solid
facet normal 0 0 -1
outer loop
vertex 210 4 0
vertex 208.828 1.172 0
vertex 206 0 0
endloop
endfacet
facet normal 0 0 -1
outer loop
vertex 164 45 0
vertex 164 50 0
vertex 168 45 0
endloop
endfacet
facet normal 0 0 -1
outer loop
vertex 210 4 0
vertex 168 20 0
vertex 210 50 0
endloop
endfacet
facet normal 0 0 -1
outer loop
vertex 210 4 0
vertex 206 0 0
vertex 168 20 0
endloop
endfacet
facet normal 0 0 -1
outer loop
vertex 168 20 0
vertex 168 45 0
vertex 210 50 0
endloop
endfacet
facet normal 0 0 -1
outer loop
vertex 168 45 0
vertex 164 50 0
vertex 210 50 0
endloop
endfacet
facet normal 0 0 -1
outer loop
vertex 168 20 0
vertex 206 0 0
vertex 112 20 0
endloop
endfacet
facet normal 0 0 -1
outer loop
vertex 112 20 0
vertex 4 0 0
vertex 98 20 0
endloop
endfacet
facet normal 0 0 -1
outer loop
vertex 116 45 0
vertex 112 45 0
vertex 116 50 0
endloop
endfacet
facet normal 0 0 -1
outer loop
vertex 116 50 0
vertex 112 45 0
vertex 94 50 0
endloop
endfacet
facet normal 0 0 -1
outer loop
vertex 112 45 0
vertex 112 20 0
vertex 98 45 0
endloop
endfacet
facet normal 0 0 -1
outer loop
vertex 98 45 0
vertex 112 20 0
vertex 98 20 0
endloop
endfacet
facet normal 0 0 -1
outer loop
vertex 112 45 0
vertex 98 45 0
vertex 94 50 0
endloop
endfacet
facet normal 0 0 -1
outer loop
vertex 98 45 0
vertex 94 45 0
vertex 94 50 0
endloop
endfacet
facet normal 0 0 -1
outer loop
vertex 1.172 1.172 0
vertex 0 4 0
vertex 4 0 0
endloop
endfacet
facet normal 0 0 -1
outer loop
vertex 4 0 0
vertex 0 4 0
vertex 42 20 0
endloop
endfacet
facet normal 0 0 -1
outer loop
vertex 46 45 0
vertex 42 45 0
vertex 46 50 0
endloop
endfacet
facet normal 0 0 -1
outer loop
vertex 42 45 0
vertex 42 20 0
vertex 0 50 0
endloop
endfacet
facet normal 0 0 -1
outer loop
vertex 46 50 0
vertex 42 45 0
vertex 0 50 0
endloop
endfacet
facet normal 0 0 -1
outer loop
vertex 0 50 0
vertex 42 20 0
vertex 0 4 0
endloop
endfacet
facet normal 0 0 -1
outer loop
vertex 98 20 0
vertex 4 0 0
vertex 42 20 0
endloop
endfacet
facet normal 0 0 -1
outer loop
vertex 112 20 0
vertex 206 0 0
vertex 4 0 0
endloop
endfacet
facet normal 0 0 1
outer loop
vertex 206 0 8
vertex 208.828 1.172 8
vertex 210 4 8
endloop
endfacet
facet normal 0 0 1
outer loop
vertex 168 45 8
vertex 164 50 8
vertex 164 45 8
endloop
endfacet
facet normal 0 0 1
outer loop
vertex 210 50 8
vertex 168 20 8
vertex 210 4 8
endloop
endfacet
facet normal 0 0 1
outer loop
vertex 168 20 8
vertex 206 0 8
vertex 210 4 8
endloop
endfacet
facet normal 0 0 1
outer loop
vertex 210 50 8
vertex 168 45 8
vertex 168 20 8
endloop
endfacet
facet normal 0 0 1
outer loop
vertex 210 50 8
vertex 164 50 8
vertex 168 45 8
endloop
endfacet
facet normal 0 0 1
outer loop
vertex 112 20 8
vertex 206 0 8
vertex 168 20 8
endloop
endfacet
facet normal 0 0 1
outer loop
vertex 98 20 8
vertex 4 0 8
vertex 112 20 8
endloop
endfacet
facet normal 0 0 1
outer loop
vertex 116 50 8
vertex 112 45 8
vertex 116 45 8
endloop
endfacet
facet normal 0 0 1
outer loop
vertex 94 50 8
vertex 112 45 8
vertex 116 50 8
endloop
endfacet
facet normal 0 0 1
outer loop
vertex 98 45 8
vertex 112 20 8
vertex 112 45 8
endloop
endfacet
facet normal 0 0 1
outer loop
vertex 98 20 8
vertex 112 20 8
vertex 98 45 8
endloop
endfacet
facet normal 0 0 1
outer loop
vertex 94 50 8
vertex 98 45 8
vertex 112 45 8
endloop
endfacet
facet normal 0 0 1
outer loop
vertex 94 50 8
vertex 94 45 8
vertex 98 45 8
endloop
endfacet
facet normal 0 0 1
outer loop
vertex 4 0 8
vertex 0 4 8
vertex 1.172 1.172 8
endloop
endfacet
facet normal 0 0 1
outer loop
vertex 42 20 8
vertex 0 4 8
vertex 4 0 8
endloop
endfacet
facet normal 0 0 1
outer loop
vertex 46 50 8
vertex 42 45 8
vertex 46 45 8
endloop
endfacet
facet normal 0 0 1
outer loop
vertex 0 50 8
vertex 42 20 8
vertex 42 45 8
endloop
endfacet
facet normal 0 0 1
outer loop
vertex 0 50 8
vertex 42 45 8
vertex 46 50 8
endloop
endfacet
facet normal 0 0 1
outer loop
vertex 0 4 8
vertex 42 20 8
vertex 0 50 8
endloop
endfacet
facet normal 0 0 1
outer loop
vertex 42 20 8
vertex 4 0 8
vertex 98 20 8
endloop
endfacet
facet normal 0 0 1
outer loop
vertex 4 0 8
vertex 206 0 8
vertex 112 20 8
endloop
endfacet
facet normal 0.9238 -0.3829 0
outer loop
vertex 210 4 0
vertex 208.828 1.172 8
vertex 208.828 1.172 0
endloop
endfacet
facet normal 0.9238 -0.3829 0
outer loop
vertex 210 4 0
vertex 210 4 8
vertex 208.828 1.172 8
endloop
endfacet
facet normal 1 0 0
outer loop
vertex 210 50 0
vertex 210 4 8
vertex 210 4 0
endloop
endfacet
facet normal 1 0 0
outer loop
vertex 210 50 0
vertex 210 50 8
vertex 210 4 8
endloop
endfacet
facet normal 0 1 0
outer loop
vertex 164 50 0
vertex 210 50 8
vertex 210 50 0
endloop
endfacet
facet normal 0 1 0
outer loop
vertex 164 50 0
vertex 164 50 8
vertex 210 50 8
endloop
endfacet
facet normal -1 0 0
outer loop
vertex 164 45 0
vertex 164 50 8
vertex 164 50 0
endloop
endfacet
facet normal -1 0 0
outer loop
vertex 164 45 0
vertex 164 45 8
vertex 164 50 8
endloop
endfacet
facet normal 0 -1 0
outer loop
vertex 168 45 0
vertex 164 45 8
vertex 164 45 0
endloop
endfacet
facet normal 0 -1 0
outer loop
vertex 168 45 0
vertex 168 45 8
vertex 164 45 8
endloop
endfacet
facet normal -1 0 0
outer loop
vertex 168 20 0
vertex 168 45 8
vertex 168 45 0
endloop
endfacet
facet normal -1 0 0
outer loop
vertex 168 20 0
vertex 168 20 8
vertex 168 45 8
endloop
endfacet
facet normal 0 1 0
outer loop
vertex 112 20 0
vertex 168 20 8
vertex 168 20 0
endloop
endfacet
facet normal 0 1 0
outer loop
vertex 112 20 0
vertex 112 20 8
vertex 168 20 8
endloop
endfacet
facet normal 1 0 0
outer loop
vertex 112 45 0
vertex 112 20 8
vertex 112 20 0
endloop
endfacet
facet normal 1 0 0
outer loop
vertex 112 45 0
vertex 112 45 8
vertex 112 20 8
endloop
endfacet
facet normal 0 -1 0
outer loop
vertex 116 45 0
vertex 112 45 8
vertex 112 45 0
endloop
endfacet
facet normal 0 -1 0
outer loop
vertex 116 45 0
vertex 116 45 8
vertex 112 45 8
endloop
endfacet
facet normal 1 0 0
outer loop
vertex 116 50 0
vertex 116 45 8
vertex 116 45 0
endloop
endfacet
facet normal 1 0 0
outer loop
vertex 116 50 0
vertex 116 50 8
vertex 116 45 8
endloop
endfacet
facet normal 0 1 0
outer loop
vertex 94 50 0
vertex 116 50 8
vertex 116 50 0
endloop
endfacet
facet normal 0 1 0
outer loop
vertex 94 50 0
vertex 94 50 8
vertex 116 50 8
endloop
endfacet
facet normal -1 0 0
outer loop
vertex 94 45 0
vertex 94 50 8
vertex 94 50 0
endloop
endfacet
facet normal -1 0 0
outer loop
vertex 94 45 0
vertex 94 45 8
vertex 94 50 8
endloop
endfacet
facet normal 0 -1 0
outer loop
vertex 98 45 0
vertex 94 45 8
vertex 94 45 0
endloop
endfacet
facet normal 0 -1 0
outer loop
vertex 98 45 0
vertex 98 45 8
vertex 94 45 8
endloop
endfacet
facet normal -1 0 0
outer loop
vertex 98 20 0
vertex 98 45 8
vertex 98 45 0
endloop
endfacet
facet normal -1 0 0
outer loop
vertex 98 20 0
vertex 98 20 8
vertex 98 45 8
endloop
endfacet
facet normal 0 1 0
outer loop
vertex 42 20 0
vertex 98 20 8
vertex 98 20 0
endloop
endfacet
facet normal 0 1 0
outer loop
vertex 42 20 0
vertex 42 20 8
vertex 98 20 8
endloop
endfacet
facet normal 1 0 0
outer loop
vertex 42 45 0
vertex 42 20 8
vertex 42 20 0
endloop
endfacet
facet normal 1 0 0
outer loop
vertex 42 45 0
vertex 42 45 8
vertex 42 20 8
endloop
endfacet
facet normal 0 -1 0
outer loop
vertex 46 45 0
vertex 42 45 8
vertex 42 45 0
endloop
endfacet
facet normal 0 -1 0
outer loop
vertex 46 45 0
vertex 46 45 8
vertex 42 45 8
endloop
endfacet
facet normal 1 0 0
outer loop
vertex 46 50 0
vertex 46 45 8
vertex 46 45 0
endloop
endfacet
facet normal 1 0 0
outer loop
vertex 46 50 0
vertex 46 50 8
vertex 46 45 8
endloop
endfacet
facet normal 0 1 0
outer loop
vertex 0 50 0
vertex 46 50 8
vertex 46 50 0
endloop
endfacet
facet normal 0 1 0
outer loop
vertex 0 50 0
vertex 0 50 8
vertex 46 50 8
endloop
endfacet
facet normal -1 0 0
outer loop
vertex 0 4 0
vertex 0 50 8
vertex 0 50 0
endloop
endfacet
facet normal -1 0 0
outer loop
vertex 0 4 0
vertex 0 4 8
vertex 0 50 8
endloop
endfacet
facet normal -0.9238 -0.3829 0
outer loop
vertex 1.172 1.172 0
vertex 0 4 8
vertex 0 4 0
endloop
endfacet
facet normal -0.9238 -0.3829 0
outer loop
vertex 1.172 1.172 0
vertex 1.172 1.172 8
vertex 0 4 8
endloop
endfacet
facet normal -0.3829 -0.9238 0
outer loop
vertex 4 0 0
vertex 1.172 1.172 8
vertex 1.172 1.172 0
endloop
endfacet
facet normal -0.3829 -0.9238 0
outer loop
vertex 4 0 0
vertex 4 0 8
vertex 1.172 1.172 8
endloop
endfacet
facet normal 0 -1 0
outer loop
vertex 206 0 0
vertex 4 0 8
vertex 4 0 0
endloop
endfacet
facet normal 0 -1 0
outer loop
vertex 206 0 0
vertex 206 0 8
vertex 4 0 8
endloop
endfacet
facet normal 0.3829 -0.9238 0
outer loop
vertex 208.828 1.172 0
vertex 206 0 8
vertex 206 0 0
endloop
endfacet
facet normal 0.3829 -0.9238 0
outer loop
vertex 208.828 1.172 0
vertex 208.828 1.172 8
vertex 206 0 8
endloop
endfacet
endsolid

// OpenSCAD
$fn = 32;

// ----------------------------------------------------------------------
// Oversize slot bar: 210 mm bar with 2 oversize windows
// ----------------------------------------------------------------------

// --- parameters (mm) ---
profile_height = 8;       // extrusion height
profile_points = 24;      // points of the closed outline

profile = [[0, 4], [1.172, 1.172], [4, 0], [206, 0], [208.828, 1.172], [210, 4], [210, 50], [164, 50], [164, 45], [168, 45], [168, 20], [112, 20], [112, 45], [116, 45], [116, 50], [94, 50], [94, 45], [98, 45], [98, 20], [42, 20], [42, 45], [46, 45], [46, 50], [0, 50]];  // single closed polygon, 24 points, counter clockwise

// --- the one profile operation ---
linear_extrude(height = profile_height) polygon(points = profile);
